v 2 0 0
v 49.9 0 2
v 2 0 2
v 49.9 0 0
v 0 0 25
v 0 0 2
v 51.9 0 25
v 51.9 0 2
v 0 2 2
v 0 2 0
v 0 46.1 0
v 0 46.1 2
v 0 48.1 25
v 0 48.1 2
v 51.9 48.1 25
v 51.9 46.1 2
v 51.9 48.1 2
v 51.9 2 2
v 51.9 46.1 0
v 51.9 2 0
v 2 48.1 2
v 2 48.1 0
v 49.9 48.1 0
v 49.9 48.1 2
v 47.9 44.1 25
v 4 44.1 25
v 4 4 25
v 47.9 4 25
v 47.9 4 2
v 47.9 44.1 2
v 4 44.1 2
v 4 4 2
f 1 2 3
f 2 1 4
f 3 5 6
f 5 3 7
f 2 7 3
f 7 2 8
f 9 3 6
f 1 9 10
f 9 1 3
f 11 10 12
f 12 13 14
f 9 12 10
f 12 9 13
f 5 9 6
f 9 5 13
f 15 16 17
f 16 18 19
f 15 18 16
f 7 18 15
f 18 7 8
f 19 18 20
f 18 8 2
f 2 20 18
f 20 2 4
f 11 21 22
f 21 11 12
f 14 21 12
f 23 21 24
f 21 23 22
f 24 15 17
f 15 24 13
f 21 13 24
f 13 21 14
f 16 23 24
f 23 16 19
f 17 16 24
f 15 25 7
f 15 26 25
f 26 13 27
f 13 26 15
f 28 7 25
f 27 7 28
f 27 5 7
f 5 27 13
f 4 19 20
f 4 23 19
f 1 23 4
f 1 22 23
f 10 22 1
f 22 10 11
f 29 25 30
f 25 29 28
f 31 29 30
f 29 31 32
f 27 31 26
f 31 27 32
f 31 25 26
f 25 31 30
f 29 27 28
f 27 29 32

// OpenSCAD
// WheresDat — Parametric small-parts box, sized to drop into
// sortimo_tray.scad's pockets.
//
// Originally included a raised label platform in one top corner,
// inspired by a Sortimo T-Boxx 2018 insert box design. Removed: a
// platform floating above the rim is an overhang, which forces support
// material when the box is printed on its side (the practical
// orientation for an open-top box) — wasted filament, and supports
// touching what's supposed to be a clean label surface is a lose-lose.
// A label just goes directly on a flat wall or the top rim instead, no
// raised feature needed.
//
// Not yet rendered/validated (no OpenSCAD CLI in this environment) —
// open in the real app, and test-fit one box against a printed tray
// pocket before committing to a batch.

/* [Grid — must match sortimo_tray.scad] */
// Changed 2026-09-07: the tray moved from individually-walled per-cell
// pockets to open channels (one central divider, no interior walls
// within a channel — see sortimo_tray.scad). Box WIDTH is still bounded
// by real tray-cut walls (the outer wall on one side, the center divider
// on the other) so it keeps the old wall-based clearance formula, fixed
// at exactly one channel wide. Box LENGTH now runs free in whole units
// (1-4) with no tray wall between adjacent boxes in the same channel —
// several can sit end to end (1x1 + 1x1 + 2x1, or one 4x1, etc.).
module_size   = 52.3; // mm — keep this in sync with sortimo_tray.scad's module_size by hand; not auto-shared across files
units_x       = 1;    // length in grid modules (1-4): how many units long this box is
units_y       = 1;    // width in CHANNELS: 1 (normal, fits one channel) or 2 (wide — straddles
                       // both channels, needs the notch below to clear the center divider)

/* [Tray fit] */
// Width: same formula as before — the channel is still bounded by real
// printed walls on both long sides, so it needs the same wall-based
// clearance logic.
// Length: NOT bounded by a tray wall except at the very ends of a
// channel — an interior box just butts up against its neighbor, so this
// uses a small fixed allowance instead of the wall-based formula. Not a
// sourced value, just enough to keep several boxes from binding
// end-to-end — verify with a test run of e.g. a 1x1 + 3x1 pair before
// committing to a full batch.
tray_wall_thickness = 3;   // mm — copy of the tray file's wall_thickness, for computing channel width here
tray_fit_clearance  = 0.3; // mm — copy of the tray file's fit_clearance
tray_pocket_depth   = 8;   // mm — copy of the tray file's pocket_depth, so a units_y=2 box knows how tall the divider stands above the channel floor
box_fit_clearance   = 0.3; // mm, additional per-side width clearance so the box drops into the channel freely
length_clearance    = 0.2; // mm, per-side length allowance so end-to-end boxes don't bind

/* [Divider notch — only used when units_y = 2] */
// A units_y=2 box's outer footprint spans corner-to-corner across BOTH
// channels (bounded only by the tray's true outer walls), which means
// the tray's solid center divider sits physically inside that footprint
// — the box has to notch around it or it won't sit flat. The notch is
// full-depth (clears the divider's whole height above the channel
// floor) and runs the box's full length, centered on the divider.
// NOTE: this leaves the divider poking up into the box's interior as a
// ridge (it's taller than the box's own floor), splitting a wide box
// into two shallow sub-compartments rather than one flat-floored bin —
// reusing the tray's own structure instead of building a separate
// internal wall. If a continuous flat floor across the full width
// matters more than that, this needs a raised/stepped floor instead —
// flag it and it can be redone.
notch_fit_clearance = 0.3; // mm, per-side clearance so the notch doesn't bind on the divider
notch_depth_clearance = 0.3; // mm, extra depth so the notch fully clears the divider's top

/* [Box construction] */
box_height    = 25;  // mm — not a sourced spec, just a reasonable default for small parts; change freely
// Doubled 2 -> 4mm (2026-09-08): thin perimeters don't have enough
// cross-sectional bonding area between adjacent print paths and were
// separating during printing — confirmed on a real print, not a
// theoretical concern. 4mm gives real overlap between passes.
wall          = 4;   // mm
floor         = 2;   // mm

// ---------------------------------------------------------------------
// Derived geometry
// ---------------------------------------------------------------------

// units_y=1 uses the same per-channel formula as always. units_y=2 spans
// both channels as one continuous outer envelope (bounded only by the
// tray's true outer walls, same insets applied once at each far edge —
// see sortimo_tray.scad's pocket math, this mirrors it for a merged span).
box_y = units_y * module_size - 2 * (tray_wall_thickness / 2 + tray_fit_clearance) - 2 * box_fit_clearance;
box_x = units_x * module_size - 2 * length_clearance; // free-running — 1 to 4 units long

// Divider gap: the actual solid width of the tray's center wall as cut
// (wall_thickness plus the fit_clearance left over on each adjacent
// pocket) — must match sortimo_tray.scad's real geometry, not just its
// nominal wall_thickness.
divider_gap   = tray_wall_thickness + 2 * tray_fit_clearance;
notch_width   = divider_gap + 2 * notch_fit_clearance;
notch_depth   = tray_pocket_depth + notch_depth_clearance;

// 2 x 45s instead of 1 sharp 90 at each base corner touching the print
// bed — sharp corners are exactly where FDM prints concentrate cooling
// stress and curl/lift off the plate; this relieves the stress point
// rather than fighting it with more bed adhesion. Only affects the
// bottom chamfer_height of the part, not the functional geometry above
// it. "A couple mm," per Russ, not a structural taper.
chamfer_size   = 2; // mm, cut along each edge meeting at the corner
chamfer_height = 2; // mm, how far up from the base the cut runs

module base_chamfer_cut(width, depth, size, height) {
    corners = [[0, 0], [width, 0], [0, depth], [width, depth]];
    for (c = corners) {
        dx = (c[0] == 0) ? 1 : -1;
        dy = (c[1] == 0) ? 1 : -1;
        translate([c[0], c[1], -0.5])
            linear_extrude(height = height + 0.5)
                polygon([[0, 0], [dx * size, 0], [0, dy * size]]);
    }
}

module small_parts_box() {
    difference() {
        cube([box_x, box_y, box_height]);
        translate([wall, wall, floor])
            cube([box_x - 2 * wall, box_y - 2 * wall, box_height]); // open top, cut through

        // Divider notch — only when this box straddles both channels.
        // Centered on box_y (the divider sits at the midpoint of a
        // symmetric 2-channel span), cut from the bottom face up through
        // the divider's full height.
        if (units_y > 1) {
            translate([-0.5, box_y / 2 - notch_width / 2, -0.5])
                cube([box_x + 1, notch_width, notch_depth + 0.5]); // +1/+0.5 so cuts clear the faces cleanly
        }

        base_chamfer_cut(box_x, box_y, chamfer_size, chamfer_height);
    }
}

small_parts_box();
